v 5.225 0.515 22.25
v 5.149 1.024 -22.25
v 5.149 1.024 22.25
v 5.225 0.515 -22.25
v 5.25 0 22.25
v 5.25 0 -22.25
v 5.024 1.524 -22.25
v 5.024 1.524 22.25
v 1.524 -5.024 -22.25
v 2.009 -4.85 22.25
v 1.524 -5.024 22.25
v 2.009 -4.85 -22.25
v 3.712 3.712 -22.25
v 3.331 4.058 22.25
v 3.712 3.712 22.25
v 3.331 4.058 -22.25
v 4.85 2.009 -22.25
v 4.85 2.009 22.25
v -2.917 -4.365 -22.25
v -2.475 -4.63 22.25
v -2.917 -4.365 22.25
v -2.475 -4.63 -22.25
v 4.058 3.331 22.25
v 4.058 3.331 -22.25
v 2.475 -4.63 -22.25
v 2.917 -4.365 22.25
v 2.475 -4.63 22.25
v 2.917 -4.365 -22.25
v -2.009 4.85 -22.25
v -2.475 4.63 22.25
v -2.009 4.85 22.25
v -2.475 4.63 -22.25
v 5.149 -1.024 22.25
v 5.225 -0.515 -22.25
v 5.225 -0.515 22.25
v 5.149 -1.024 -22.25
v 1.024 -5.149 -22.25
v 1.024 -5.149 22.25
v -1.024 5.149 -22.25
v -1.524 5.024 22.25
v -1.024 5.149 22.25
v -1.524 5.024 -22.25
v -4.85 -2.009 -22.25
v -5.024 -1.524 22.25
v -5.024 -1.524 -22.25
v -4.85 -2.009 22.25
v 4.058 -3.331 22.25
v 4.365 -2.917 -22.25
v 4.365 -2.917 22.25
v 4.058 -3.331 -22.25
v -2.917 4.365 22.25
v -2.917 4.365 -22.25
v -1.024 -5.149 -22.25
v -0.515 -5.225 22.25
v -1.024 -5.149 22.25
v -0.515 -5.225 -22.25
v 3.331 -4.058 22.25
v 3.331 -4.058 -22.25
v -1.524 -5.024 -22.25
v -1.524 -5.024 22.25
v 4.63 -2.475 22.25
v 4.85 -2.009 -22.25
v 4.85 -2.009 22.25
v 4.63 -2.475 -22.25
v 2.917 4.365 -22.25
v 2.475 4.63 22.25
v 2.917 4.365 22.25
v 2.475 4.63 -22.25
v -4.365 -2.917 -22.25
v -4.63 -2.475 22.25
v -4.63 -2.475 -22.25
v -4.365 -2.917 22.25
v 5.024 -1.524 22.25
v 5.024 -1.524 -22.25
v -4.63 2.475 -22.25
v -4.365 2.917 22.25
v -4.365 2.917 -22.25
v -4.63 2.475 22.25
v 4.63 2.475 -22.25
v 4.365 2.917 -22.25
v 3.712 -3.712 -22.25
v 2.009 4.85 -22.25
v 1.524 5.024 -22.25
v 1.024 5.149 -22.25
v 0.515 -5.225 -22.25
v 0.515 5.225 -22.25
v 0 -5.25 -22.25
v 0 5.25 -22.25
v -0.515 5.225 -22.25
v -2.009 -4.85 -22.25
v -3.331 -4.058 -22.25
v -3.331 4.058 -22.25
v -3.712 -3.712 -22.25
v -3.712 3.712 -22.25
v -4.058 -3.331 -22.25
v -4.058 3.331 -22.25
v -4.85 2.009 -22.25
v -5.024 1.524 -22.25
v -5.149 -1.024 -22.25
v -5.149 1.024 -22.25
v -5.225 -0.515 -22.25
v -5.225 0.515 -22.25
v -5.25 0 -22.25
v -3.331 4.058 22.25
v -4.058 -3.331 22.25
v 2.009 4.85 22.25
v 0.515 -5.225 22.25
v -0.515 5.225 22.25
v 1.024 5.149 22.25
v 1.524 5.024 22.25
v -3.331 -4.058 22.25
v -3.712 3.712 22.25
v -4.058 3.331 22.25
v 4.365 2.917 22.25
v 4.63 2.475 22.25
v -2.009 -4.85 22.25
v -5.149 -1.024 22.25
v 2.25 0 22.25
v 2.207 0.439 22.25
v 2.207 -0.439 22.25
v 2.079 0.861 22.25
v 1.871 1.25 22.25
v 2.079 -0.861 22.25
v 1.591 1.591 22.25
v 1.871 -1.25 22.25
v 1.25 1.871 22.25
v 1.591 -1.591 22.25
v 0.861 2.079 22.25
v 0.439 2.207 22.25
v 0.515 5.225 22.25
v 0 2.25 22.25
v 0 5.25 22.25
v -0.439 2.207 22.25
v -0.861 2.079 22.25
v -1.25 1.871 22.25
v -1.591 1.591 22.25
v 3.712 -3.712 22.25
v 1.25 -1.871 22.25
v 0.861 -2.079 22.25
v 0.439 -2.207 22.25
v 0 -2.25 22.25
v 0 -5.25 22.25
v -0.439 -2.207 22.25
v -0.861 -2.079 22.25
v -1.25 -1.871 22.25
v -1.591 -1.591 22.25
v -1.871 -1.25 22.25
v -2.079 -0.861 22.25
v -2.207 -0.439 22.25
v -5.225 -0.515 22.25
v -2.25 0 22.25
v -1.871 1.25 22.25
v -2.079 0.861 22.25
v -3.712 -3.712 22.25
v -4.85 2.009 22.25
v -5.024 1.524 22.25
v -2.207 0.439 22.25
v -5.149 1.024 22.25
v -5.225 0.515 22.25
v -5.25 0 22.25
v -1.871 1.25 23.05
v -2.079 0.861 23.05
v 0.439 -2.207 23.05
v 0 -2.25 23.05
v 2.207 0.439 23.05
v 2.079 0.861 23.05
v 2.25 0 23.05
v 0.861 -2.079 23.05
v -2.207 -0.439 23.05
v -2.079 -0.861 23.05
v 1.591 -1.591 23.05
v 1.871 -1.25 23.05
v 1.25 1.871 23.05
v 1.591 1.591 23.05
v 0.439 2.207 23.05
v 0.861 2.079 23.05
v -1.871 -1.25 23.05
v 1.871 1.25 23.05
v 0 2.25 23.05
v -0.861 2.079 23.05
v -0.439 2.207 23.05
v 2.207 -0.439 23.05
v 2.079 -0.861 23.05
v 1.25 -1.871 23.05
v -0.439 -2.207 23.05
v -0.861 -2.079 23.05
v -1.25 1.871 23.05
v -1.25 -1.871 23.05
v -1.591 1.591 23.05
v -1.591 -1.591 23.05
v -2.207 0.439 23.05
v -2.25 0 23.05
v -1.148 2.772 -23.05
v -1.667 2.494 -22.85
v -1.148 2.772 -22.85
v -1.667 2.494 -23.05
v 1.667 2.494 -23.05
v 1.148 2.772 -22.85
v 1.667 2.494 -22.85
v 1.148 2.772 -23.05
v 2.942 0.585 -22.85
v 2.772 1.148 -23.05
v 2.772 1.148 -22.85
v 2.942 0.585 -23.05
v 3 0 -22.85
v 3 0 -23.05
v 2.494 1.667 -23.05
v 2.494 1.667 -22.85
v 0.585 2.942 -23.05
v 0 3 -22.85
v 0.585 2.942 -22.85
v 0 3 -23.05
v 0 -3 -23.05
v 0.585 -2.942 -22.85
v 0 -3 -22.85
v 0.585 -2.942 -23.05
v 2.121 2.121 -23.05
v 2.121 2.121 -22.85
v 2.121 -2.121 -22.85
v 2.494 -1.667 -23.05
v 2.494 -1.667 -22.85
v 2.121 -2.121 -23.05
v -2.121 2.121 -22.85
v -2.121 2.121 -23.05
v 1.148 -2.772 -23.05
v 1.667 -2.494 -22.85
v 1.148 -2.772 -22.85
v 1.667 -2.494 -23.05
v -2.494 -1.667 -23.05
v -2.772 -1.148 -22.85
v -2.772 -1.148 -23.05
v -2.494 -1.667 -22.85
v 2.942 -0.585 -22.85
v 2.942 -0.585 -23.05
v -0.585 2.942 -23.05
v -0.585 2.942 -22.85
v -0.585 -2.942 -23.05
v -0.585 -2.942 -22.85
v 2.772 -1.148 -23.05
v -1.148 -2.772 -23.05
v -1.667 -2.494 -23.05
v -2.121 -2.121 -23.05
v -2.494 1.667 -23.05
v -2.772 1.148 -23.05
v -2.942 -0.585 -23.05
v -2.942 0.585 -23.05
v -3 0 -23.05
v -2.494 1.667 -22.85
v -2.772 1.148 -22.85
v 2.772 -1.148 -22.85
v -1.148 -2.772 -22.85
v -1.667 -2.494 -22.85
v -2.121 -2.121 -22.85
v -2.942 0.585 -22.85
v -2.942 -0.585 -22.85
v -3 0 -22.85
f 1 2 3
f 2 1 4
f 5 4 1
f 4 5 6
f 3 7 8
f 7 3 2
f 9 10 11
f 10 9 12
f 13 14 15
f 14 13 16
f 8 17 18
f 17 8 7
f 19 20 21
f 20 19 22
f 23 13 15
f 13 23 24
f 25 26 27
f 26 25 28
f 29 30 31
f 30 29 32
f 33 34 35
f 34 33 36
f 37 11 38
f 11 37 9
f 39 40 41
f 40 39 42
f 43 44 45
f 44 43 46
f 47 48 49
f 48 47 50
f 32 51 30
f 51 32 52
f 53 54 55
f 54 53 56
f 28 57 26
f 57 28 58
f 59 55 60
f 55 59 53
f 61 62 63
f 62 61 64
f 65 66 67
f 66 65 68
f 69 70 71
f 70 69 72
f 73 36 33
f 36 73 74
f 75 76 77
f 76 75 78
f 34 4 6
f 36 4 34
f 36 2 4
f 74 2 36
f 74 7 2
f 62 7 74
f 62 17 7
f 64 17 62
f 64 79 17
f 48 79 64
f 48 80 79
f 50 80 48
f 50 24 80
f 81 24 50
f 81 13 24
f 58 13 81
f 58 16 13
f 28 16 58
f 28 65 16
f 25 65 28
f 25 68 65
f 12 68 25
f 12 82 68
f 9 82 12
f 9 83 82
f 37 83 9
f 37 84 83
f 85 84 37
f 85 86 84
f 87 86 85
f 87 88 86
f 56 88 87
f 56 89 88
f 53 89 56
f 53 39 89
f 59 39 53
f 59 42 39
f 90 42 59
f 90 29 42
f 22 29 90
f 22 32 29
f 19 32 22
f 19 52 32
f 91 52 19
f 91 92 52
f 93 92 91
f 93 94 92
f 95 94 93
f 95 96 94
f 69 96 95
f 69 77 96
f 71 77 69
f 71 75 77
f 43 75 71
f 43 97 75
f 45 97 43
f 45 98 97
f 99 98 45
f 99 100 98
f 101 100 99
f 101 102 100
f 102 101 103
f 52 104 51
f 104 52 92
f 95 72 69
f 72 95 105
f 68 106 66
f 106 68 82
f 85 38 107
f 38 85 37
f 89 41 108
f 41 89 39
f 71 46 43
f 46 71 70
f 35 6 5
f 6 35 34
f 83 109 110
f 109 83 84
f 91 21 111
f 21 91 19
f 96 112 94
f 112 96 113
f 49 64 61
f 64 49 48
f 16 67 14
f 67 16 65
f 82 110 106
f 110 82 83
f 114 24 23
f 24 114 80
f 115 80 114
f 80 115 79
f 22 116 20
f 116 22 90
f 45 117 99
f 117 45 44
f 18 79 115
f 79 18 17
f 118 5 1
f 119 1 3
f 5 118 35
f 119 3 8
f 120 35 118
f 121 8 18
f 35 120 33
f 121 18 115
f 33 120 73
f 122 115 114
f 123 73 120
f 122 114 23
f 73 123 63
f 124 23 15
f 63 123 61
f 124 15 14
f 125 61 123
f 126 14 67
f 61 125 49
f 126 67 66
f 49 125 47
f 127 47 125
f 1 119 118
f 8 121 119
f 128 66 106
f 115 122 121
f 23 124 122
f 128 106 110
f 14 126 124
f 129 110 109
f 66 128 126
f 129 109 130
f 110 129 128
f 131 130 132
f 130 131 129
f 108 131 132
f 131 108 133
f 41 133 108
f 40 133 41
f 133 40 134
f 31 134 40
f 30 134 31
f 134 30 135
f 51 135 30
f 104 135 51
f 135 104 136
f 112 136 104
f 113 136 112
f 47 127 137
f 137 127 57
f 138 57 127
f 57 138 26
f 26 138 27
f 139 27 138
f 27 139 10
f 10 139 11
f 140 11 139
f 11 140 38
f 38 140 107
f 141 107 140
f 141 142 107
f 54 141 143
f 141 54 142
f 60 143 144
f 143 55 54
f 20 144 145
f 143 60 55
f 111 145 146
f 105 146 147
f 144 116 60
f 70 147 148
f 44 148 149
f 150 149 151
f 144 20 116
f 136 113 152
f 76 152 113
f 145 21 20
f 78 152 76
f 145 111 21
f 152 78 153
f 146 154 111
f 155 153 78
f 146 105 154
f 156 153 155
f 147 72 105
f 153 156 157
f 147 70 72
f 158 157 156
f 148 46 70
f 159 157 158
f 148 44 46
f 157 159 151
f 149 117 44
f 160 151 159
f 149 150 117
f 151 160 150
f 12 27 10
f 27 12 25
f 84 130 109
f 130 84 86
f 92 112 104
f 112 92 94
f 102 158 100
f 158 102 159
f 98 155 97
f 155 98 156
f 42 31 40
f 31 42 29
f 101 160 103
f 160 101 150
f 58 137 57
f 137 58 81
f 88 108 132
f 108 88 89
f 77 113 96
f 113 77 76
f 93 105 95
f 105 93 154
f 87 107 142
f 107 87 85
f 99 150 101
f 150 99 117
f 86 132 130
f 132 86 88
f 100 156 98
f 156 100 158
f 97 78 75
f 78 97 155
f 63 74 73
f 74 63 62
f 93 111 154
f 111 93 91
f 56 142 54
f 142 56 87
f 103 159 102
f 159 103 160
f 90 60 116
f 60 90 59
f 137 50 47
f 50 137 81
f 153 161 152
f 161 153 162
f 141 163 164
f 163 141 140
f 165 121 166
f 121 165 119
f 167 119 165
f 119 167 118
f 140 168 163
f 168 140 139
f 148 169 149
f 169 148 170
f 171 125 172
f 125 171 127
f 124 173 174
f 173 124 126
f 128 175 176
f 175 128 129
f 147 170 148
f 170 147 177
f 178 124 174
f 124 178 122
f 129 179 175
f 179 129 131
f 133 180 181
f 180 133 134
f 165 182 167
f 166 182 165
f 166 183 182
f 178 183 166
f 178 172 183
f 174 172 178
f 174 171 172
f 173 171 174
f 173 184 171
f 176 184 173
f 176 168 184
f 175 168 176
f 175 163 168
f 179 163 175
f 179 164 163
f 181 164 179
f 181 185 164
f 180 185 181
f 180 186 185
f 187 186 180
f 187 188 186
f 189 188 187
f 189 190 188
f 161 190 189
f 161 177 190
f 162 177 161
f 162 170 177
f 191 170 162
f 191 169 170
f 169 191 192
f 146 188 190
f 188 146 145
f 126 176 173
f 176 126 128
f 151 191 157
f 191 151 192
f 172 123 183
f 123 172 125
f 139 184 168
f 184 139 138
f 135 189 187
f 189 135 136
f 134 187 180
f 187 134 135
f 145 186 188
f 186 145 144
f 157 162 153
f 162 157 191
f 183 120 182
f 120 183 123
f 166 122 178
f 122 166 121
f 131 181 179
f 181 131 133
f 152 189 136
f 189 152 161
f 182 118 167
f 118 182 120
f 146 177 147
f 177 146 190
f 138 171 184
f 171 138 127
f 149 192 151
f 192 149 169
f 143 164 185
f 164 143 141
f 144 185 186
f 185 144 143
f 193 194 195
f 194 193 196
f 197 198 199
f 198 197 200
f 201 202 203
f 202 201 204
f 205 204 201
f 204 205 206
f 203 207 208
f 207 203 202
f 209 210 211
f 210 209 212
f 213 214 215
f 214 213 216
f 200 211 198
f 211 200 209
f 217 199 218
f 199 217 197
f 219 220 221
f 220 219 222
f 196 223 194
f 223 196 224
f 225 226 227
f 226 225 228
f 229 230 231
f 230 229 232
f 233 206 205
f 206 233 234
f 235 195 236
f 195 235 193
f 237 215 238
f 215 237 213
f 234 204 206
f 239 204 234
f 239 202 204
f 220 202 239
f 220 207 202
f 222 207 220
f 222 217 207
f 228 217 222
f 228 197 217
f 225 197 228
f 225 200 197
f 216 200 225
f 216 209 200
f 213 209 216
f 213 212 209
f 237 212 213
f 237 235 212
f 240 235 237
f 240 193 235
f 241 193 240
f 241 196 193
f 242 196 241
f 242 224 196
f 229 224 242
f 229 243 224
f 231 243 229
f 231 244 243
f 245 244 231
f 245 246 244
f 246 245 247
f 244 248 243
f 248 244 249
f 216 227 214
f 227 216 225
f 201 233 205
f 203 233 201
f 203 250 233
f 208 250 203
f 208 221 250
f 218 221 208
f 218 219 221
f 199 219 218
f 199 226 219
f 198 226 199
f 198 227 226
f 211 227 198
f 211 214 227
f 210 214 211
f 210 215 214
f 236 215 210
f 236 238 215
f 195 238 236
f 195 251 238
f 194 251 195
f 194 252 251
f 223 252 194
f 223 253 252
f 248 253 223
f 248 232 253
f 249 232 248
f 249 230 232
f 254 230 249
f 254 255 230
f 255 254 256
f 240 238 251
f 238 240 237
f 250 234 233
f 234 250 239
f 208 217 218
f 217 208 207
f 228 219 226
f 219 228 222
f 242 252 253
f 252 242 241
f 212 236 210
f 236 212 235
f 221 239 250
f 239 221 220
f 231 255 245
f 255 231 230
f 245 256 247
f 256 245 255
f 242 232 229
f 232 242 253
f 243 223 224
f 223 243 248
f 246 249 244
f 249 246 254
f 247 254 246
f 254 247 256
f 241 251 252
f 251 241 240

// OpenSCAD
// Parameters
height_mm = 44.5; //[22.25:89:0.1]
diameter_mm = 10.5; //[5.25:21:0.1]
body_diameter_mm = 10.5; //[5.25:21:0.1]
body_height_mm = 44.5; //[22.25:89:0.1]
positive_terminal_diameter_mm = 4.5; //[2.25:9:0.1]
positive_terminal_height_mm = 1; //[0.5:2:0.05]
negative_terminal_diameter_mm = 6; //[3:12:0.1]
negative_terminal_height_mm = 0.2; //[0.1:0.6:0.05]
terminal_edge_radius_mm = 0.5; //[0.25:1:0.05]
connect_overlap_mm = 0.8; //[0.5:2:0.1]

// Battery - complete geometry
module battery() {
  color("DimGray") {
    // Main cylindrical body
    cylinder(h=body_height_mm, r=body_diameter_mm/2, center=true, $fn=64);
    
    // Positive terminal button
    translate([0, 0, body_height_mm/2 - positive_terminal_height_mm/2 + connect_overlap_mm]) {
      cylinder(h=positive_terminal_height_mm, r=positive_terminal_diameter_mm/2, center=true, $fn=32);
    }
    
    // Negative terminal flat contact
    translate([0, 0, -body_height_mm/2 + negative_terminal_height_mm/2 - connect_overlap_mm]) {
      cylinder(h=negative_terminal_height_mm, r=negative_terminal_diameter_mm/2, center=true, $fn=32);
    }
  }
}

// Assembly
module assembly() {
  battery();
}

assembly();
